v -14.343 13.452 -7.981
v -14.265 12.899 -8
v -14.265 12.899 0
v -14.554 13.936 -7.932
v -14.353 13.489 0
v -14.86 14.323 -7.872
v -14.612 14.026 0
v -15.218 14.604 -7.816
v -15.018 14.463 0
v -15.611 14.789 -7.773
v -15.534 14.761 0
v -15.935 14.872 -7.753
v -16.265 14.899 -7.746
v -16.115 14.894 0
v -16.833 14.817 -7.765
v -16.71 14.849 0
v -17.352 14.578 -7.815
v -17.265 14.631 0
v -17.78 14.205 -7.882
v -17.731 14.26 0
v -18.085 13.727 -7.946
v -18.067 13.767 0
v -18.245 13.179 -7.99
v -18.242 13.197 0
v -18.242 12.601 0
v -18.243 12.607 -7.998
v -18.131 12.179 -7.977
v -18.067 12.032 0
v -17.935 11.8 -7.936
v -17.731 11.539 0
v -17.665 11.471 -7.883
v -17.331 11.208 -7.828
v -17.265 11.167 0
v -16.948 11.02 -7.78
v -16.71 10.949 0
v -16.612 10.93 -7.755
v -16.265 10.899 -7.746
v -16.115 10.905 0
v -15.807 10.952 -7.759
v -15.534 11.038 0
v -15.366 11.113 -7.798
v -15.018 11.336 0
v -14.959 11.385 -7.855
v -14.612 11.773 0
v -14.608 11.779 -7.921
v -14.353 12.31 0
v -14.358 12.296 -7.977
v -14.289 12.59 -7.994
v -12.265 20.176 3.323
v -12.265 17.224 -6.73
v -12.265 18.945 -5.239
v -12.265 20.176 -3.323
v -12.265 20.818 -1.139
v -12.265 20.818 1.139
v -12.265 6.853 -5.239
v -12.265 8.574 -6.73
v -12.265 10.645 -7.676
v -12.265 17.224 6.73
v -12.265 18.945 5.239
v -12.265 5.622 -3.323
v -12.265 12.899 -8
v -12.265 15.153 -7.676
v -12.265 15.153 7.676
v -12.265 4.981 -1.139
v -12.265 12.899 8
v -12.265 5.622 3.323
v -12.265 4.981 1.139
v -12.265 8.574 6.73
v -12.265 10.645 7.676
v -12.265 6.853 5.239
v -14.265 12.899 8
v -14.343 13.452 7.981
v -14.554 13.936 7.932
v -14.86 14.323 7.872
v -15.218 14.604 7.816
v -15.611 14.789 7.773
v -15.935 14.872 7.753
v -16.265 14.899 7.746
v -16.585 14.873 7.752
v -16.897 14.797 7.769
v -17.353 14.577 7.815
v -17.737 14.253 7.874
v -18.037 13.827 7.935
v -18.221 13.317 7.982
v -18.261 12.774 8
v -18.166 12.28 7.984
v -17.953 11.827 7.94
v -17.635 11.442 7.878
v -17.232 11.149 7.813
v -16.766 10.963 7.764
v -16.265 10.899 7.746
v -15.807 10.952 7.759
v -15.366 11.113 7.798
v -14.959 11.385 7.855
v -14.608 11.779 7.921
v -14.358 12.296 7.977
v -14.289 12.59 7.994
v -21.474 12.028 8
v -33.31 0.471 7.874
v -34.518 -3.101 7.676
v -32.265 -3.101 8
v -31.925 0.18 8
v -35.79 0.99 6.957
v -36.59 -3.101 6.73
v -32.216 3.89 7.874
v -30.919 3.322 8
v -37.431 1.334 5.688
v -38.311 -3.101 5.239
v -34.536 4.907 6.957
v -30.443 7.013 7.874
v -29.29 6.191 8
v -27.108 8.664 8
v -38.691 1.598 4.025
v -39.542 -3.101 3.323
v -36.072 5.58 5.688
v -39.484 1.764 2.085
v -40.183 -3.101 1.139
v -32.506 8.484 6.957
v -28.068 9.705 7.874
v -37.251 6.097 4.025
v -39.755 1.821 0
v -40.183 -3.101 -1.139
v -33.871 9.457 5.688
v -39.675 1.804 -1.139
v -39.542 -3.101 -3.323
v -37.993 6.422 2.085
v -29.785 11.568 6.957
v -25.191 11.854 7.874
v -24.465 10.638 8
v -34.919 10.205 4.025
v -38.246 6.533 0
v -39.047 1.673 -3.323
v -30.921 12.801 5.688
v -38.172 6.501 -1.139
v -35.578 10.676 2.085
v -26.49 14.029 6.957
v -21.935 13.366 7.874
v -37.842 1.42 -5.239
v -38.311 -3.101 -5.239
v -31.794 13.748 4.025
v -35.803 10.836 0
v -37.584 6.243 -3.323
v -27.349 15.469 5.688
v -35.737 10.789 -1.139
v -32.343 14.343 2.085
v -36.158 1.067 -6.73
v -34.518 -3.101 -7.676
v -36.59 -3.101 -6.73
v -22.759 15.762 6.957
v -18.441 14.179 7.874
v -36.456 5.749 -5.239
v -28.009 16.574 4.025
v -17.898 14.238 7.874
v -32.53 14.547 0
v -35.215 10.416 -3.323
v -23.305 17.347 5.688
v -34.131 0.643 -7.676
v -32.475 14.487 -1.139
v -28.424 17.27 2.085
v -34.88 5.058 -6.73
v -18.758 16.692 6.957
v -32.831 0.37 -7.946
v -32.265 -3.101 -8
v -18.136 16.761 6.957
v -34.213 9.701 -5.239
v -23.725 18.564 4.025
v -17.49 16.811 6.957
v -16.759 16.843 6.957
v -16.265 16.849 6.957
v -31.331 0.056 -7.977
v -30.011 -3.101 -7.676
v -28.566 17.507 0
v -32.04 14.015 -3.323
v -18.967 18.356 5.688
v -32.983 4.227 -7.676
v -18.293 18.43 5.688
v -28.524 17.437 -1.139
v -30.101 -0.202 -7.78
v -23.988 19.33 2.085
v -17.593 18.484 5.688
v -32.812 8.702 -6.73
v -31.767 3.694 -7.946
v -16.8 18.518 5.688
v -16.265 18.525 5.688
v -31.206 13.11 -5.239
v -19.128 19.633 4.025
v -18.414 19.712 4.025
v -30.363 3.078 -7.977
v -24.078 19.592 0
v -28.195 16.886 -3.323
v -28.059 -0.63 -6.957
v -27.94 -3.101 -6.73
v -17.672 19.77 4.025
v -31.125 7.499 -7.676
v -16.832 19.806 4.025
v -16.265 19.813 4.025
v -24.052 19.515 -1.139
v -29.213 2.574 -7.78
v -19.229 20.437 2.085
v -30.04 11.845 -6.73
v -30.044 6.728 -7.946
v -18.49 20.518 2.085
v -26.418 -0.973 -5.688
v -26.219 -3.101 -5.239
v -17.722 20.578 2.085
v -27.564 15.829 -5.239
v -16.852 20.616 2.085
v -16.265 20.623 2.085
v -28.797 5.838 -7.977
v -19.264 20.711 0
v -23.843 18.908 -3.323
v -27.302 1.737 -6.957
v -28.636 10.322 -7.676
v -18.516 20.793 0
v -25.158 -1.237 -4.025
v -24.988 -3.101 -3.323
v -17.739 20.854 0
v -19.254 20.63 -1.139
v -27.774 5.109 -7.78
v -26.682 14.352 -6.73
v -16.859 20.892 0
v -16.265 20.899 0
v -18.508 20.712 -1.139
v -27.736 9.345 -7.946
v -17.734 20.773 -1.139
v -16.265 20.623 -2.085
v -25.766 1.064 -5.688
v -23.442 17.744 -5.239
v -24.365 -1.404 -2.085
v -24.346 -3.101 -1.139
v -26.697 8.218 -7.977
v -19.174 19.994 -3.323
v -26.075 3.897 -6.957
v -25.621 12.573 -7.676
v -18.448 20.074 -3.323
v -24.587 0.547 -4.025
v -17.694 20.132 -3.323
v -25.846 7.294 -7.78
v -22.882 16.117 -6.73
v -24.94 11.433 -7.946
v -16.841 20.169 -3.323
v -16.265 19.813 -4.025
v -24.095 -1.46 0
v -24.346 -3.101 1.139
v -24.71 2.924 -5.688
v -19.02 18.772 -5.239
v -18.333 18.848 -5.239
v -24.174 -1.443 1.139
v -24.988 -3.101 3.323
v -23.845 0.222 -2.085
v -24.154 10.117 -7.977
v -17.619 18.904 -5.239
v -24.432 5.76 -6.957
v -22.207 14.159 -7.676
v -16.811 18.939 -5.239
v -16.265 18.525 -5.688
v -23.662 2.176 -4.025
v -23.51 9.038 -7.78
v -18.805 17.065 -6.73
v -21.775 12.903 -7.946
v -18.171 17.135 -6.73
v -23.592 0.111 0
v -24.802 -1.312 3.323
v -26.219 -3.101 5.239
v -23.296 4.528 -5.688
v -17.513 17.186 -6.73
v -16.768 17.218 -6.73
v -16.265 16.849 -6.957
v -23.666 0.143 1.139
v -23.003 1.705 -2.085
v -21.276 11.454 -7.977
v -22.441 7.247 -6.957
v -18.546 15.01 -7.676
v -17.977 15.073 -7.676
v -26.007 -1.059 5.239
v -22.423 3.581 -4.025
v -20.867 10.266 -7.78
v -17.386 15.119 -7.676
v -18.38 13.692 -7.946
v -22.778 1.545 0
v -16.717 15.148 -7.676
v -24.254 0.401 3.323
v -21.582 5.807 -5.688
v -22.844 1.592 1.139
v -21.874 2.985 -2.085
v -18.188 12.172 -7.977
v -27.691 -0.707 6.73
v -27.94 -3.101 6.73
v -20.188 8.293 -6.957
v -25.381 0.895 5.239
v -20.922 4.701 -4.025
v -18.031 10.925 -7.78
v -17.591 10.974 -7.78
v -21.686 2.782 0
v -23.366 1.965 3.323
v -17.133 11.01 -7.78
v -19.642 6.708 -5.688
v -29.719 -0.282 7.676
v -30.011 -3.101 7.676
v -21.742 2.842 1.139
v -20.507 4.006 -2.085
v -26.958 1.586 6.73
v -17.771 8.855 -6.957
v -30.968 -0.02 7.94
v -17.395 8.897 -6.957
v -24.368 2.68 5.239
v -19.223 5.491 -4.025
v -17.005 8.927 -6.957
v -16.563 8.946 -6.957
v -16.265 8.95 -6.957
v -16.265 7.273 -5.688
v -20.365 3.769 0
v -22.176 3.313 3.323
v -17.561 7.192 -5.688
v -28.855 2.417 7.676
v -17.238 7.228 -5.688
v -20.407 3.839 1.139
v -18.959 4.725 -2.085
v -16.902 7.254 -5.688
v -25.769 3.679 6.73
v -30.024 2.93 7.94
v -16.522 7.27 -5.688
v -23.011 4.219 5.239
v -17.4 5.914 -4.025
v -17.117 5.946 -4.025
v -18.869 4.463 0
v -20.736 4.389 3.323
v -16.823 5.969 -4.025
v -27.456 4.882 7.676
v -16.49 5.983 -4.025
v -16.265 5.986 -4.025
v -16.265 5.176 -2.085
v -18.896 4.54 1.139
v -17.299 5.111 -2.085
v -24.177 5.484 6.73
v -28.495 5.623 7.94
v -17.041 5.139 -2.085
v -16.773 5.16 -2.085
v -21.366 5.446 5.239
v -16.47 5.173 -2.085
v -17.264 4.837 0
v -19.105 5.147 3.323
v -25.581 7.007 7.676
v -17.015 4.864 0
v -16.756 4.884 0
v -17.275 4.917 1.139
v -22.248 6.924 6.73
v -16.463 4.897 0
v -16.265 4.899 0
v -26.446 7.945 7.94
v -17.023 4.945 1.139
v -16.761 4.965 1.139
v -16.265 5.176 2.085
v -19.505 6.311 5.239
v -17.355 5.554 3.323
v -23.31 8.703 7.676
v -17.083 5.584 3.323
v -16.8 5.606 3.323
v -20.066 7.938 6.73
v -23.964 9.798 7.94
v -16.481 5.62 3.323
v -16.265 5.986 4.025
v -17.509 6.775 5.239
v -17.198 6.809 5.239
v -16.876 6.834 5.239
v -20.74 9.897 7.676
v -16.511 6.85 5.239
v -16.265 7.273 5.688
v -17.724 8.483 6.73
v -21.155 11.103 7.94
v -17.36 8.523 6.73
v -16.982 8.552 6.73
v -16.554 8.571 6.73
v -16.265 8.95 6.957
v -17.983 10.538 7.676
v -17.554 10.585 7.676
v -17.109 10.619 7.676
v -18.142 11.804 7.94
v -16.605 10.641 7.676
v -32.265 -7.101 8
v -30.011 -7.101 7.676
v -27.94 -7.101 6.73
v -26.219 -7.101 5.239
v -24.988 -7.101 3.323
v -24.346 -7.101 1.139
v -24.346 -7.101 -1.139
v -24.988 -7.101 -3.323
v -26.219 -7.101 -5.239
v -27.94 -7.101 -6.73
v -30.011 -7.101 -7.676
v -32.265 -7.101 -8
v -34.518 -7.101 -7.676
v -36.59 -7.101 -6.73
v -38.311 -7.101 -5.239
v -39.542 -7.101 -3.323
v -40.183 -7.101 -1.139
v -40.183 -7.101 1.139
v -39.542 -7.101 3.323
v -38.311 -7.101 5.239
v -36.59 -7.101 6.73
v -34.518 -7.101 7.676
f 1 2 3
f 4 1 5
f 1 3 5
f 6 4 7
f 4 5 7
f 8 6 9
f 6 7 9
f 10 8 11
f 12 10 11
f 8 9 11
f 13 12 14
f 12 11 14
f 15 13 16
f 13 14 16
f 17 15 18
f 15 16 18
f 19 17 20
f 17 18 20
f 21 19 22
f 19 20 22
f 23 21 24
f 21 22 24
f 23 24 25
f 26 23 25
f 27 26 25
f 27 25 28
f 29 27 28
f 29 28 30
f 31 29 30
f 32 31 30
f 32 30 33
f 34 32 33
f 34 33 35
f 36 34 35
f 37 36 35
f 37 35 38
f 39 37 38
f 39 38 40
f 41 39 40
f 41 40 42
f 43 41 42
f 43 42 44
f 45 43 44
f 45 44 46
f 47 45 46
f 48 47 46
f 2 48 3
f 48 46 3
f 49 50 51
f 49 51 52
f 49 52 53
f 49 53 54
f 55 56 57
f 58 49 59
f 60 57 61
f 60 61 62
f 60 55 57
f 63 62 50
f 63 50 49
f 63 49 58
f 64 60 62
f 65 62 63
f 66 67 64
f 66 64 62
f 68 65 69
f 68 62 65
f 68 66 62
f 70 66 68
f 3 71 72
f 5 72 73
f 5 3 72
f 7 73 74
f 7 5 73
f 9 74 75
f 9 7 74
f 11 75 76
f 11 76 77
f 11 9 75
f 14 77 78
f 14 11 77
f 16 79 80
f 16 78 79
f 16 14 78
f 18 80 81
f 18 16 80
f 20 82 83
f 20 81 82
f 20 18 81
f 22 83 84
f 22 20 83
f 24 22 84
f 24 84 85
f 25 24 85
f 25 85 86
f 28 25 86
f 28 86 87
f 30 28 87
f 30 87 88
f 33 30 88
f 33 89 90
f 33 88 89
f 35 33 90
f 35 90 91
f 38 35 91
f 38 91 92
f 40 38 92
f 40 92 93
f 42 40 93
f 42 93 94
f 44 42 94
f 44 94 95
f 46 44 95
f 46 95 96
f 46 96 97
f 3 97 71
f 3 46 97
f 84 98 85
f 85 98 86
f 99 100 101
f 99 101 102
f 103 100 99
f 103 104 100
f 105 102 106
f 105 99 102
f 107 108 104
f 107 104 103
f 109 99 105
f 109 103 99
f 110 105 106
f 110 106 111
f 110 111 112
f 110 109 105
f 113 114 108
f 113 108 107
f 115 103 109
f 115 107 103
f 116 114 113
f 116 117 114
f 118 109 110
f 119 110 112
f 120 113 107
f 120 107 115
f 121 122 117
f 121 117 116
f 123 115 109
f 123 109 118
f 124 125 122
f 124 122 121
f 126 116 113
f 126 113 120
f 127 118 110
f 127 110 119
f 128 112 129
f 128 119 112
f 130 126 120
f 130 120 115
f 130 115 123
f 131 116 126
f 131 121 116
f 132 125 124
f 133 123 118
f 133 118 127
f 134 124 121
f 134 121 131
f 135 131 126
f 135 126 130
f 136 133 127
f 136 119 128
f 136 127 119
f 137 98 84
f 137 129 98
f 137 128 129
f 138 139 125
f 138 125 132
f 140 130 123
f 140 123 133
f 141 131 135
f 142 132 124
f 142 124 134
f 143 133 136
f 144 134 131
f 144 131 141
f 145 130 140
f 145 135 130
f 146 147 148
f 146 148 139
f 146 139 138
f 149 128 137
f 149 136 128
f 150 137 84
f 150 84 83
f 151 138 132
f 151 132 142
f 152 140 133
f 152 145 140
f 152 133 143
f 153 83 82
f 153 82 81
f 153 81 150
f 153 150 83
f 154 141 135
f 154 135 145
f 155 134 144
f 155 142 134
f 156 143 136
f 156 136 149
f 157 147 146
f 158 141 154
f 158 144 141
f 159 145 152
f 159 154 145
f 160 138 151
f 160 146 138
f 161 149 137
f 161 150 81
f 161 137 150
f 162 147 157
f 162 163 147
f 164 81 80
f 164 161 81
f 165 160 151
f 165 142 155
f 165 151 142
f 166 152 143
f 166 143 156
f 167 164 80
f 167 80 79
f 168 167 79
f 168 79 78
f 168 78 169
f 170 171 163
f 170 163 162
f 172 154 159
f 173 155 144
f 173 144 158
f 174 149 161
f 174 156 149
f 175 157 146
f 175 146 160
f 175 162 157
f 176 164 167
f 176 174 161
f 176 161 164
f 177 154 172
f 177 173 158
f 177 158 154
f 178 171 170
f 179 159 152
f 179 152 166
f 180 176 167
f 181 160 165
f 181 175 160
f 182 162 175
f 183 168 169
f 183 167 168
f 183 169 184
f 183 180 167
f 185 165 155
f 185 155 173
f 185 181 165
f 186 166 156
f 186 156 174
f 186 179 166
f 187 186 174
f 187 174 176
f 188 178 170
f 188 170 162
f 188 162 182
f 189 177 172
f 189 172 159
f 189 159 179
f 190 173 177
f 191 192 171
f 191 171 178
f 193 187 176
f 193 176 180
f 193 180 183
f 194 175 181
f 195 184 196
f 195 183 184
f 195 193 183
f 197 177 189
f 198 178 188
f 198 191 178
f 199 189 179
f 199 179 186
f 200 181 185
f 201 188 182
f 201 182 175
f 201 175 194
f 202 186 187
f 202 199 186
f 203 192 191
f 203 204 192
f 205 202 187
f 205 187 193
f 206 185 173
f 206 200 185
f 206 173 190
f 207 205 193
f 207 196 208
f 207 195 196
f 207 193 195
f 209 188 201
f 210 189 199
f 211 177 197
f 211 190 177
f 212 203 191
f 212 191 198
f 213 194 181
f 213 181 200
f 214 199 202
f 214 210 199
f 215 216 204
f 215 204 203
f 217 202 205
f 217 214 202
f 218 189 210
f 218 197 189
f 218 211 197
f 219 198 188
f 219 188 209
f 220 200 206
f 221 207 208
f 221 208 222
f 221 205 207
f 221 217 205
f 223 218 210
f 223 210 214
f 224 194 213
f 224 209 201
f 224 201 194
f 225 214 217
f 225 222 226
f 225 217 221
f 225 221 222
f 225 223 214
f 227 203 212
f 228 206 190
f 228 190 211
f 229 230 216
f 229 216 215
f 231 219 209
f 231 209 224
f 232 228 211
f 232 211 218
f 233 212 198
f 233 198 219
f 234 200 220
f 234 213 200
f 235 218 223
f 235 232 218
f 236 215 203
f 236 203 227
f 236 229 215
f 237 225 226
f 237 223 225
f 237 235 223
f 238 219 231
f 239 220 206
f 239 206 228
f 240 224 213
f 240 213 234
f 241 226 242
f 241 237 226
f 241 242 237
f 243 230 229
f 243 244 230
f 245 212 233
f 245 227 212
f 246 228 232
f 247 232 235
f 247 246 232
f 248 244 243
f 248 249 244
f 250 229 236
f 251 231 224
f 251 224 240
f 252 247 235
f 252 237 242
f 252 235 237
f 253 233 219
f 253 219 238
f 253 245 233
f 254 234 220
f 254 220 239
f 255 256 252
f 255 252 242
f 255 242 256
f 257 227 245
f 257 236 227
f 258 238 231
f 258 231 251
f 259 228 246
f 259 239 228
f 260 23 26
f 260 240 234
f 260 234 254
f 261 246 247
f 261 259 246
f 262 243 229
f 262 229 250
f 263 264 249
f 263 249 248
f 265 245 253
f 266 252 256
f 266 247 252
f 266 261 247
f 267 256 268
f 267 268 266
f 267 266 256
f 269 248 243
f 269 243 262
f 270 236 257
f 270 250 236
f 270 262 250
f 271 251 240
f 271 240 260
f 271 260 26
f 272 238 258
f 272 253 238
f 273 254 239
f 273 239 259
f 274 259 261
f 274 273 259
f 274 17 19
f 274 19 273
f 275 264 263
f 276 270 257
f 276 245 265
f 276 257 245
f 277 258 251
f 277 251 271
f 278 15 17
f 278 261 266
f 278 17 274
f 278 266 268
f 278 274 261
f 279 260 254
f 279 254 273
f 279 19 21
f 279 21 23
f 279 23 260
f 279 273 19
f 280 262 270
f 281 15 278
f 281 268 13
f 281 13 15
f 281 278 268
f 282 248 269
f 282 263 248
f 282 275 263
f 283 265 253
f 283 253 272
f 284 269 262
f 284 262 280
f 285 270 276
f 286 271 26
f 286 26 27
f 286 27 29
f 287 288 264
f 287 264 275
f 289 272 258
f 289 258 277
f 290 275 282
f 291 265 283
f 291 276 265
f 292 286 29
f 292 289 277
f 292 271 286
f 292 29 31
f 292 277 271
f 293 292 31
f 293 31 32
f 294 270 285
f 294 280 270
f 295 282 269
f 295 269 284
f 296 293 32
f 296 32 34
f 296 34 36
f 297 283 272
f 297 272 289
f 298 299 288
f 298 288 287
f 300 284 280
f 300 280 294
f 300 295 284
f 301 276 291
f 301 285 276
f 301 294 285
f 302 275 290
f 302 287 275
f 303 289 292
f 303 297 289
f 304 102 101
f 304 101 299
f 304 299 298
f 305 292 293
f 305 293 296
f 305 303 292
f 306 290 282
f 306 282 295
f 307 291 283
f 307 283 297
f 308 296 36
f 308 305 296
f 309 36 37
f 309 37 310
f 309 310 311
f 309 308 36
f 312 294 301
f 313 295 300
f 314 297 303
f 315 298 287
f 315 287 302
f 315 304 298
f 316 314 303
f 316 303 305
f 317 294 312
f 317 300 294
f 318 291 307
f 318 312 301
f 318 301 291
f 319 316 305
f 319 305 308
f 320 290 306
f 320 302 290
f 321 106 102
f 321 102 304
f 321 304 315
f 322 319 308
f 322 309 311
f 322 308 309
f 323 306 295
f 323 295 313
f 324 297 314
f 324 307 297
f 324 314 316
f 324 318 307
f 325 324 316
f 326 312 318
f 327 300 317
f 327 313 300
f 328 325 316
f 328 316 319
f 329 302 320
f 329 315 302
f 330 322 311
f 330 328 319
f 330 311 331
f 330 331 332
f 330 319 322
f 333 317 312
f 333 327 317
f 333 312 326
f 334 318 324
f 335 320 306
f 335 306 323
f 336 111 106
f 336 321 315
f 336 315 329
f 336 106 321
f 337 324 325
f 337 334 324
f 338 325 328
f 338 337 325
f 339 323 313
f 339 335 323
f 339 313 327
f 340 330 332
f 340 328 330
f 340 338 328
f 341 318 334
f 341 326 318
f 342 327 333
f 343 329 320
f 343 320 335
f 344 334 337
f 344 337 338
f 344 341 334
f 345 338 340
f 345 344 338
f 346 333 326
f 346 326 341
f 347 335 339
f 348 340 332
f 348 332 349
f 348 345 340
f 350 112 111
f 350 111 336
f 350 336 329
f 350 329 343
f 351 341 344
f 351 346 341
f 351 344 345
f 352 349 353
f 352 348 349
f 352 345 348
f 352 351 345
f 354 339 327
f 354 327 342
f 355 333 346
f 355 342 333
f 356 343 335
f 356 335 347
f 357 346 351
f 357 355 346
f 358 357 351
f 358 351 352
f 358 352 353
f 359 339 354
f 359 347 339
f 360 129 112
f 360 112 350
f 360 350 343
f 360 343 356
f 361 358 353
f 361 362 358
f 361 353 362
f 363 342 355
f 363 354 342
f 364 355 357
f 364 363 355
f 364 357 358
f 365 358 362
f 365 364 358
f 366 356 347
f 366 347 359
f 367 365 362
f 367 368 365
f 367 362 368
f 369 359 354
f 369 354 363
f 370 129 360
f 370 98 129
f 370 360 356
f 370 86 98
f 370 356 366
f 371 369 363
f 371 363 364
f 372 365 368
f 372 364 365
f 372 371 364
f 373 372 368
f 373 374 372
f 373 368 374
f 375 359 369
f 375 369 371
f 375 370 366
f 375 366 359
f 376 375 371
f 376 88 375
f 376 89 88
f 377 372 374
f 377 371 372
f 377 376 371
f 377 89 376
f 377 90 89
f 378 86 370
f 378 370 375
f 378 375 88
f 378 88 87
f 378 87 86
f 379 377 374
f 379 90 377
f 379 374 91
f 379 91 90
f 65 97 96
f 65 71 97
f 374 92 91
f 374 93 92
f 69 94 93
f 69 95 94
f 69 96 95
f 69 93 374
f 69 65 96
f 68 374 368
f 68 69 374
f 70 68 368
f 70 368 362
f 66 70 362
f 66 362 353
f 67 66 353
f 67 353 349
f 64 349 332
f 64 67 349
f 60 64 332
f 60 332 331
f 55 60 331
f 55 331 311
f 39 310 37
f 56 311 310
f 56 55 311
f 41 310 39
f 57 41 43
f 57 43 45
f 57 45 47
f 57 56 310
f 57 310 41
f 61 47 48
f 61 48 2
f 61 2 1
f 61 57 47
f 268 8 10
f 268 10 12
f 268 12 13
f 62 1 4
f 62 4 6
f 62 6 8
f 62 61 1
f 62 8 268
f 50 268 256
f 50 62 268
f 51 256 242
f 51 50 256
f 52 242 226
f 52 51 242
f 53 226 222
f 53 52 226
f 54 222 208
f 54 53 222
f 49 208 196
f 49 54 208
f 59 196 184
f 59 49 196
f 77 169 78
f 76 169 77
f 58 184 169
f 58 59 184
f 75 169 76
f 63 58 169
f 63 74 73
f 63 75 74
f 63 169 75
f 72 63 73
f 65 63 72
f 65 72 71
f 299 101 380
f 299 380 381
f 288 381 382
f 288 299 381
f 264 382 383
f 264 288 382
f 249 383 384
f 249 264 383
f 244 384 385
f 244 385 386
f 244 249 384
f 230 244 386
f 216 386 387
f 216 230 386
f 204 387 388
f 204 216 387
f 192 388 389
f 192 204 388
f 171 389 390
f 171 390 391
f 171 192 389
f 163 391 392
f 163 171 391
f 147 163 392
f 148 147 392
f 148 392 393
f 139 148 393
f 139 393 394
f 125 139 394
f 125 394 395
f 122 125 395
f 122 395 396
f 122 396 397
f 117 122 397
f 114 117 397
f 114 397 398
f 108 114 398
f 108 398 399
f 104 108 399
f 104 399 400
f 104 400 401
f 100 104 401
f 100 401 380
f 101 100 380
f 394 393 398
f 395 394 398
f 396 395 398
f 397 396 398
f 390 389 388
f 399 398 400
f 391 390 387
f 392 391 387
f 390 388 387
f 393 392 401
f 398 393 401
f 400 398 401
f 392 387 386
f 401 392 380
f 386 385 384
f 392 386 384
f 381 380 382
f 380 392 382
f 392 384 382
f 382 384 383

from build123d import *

# Parameters (mm, degrees)
SWEEP_2_PROFILE_R        = 8
CUT_EXTRUDE_3_DEPTH      = 10
CUT_EXTRUDE_3_DEPTH_BACK = 10
SKETCH_19_R              = 2


with BuildPart() as part:
    # 扫描2: sweep along a path in 草图1
    with BuildLine(Plane.XY) as sweep_2_path:
        Line((-32.264627437, -7.100709513), (-32.264627437, -3.100709513))
        ThreePointArc((-32.264627437, -3.100709513), (-27.578335936, 8.212998986), (-16.264627437, 12.899290487))
        Line((-16.264627437, 12.899290487), (-12.264627437, 12.899290487))
    # 扫描2 profile (on start of the path) → 扫描2 (sweep)
    with BuildSketch(Plane(origin=(-32.264627437, -7.100709513, 0), x_dir=(0, 0, 1), z_dir=(0, 1, 0))):
        Circle(SWEEP_2_PROFILE_R)
    sweep(path=sweep_2_path.line)

    # 草图19 → 切除-拉伸3 (cut, two sides: drawn at the far end of the back side and taken through both)
    with BuildSketch(Plane.XY.offset(-CUT_EXTRUDE_3_DEPTH_BACK)):
        with Locations((-16.264627437, 12.899290487)):
            Circle(SKETCH_19_R)
    extrude(amount=CUT_EXTRUDE_3_DEPTH + CUT_EXTRUDE_3_DEPTH_BACK, mode=Mode.SUBTRACT)


solid = part.part
